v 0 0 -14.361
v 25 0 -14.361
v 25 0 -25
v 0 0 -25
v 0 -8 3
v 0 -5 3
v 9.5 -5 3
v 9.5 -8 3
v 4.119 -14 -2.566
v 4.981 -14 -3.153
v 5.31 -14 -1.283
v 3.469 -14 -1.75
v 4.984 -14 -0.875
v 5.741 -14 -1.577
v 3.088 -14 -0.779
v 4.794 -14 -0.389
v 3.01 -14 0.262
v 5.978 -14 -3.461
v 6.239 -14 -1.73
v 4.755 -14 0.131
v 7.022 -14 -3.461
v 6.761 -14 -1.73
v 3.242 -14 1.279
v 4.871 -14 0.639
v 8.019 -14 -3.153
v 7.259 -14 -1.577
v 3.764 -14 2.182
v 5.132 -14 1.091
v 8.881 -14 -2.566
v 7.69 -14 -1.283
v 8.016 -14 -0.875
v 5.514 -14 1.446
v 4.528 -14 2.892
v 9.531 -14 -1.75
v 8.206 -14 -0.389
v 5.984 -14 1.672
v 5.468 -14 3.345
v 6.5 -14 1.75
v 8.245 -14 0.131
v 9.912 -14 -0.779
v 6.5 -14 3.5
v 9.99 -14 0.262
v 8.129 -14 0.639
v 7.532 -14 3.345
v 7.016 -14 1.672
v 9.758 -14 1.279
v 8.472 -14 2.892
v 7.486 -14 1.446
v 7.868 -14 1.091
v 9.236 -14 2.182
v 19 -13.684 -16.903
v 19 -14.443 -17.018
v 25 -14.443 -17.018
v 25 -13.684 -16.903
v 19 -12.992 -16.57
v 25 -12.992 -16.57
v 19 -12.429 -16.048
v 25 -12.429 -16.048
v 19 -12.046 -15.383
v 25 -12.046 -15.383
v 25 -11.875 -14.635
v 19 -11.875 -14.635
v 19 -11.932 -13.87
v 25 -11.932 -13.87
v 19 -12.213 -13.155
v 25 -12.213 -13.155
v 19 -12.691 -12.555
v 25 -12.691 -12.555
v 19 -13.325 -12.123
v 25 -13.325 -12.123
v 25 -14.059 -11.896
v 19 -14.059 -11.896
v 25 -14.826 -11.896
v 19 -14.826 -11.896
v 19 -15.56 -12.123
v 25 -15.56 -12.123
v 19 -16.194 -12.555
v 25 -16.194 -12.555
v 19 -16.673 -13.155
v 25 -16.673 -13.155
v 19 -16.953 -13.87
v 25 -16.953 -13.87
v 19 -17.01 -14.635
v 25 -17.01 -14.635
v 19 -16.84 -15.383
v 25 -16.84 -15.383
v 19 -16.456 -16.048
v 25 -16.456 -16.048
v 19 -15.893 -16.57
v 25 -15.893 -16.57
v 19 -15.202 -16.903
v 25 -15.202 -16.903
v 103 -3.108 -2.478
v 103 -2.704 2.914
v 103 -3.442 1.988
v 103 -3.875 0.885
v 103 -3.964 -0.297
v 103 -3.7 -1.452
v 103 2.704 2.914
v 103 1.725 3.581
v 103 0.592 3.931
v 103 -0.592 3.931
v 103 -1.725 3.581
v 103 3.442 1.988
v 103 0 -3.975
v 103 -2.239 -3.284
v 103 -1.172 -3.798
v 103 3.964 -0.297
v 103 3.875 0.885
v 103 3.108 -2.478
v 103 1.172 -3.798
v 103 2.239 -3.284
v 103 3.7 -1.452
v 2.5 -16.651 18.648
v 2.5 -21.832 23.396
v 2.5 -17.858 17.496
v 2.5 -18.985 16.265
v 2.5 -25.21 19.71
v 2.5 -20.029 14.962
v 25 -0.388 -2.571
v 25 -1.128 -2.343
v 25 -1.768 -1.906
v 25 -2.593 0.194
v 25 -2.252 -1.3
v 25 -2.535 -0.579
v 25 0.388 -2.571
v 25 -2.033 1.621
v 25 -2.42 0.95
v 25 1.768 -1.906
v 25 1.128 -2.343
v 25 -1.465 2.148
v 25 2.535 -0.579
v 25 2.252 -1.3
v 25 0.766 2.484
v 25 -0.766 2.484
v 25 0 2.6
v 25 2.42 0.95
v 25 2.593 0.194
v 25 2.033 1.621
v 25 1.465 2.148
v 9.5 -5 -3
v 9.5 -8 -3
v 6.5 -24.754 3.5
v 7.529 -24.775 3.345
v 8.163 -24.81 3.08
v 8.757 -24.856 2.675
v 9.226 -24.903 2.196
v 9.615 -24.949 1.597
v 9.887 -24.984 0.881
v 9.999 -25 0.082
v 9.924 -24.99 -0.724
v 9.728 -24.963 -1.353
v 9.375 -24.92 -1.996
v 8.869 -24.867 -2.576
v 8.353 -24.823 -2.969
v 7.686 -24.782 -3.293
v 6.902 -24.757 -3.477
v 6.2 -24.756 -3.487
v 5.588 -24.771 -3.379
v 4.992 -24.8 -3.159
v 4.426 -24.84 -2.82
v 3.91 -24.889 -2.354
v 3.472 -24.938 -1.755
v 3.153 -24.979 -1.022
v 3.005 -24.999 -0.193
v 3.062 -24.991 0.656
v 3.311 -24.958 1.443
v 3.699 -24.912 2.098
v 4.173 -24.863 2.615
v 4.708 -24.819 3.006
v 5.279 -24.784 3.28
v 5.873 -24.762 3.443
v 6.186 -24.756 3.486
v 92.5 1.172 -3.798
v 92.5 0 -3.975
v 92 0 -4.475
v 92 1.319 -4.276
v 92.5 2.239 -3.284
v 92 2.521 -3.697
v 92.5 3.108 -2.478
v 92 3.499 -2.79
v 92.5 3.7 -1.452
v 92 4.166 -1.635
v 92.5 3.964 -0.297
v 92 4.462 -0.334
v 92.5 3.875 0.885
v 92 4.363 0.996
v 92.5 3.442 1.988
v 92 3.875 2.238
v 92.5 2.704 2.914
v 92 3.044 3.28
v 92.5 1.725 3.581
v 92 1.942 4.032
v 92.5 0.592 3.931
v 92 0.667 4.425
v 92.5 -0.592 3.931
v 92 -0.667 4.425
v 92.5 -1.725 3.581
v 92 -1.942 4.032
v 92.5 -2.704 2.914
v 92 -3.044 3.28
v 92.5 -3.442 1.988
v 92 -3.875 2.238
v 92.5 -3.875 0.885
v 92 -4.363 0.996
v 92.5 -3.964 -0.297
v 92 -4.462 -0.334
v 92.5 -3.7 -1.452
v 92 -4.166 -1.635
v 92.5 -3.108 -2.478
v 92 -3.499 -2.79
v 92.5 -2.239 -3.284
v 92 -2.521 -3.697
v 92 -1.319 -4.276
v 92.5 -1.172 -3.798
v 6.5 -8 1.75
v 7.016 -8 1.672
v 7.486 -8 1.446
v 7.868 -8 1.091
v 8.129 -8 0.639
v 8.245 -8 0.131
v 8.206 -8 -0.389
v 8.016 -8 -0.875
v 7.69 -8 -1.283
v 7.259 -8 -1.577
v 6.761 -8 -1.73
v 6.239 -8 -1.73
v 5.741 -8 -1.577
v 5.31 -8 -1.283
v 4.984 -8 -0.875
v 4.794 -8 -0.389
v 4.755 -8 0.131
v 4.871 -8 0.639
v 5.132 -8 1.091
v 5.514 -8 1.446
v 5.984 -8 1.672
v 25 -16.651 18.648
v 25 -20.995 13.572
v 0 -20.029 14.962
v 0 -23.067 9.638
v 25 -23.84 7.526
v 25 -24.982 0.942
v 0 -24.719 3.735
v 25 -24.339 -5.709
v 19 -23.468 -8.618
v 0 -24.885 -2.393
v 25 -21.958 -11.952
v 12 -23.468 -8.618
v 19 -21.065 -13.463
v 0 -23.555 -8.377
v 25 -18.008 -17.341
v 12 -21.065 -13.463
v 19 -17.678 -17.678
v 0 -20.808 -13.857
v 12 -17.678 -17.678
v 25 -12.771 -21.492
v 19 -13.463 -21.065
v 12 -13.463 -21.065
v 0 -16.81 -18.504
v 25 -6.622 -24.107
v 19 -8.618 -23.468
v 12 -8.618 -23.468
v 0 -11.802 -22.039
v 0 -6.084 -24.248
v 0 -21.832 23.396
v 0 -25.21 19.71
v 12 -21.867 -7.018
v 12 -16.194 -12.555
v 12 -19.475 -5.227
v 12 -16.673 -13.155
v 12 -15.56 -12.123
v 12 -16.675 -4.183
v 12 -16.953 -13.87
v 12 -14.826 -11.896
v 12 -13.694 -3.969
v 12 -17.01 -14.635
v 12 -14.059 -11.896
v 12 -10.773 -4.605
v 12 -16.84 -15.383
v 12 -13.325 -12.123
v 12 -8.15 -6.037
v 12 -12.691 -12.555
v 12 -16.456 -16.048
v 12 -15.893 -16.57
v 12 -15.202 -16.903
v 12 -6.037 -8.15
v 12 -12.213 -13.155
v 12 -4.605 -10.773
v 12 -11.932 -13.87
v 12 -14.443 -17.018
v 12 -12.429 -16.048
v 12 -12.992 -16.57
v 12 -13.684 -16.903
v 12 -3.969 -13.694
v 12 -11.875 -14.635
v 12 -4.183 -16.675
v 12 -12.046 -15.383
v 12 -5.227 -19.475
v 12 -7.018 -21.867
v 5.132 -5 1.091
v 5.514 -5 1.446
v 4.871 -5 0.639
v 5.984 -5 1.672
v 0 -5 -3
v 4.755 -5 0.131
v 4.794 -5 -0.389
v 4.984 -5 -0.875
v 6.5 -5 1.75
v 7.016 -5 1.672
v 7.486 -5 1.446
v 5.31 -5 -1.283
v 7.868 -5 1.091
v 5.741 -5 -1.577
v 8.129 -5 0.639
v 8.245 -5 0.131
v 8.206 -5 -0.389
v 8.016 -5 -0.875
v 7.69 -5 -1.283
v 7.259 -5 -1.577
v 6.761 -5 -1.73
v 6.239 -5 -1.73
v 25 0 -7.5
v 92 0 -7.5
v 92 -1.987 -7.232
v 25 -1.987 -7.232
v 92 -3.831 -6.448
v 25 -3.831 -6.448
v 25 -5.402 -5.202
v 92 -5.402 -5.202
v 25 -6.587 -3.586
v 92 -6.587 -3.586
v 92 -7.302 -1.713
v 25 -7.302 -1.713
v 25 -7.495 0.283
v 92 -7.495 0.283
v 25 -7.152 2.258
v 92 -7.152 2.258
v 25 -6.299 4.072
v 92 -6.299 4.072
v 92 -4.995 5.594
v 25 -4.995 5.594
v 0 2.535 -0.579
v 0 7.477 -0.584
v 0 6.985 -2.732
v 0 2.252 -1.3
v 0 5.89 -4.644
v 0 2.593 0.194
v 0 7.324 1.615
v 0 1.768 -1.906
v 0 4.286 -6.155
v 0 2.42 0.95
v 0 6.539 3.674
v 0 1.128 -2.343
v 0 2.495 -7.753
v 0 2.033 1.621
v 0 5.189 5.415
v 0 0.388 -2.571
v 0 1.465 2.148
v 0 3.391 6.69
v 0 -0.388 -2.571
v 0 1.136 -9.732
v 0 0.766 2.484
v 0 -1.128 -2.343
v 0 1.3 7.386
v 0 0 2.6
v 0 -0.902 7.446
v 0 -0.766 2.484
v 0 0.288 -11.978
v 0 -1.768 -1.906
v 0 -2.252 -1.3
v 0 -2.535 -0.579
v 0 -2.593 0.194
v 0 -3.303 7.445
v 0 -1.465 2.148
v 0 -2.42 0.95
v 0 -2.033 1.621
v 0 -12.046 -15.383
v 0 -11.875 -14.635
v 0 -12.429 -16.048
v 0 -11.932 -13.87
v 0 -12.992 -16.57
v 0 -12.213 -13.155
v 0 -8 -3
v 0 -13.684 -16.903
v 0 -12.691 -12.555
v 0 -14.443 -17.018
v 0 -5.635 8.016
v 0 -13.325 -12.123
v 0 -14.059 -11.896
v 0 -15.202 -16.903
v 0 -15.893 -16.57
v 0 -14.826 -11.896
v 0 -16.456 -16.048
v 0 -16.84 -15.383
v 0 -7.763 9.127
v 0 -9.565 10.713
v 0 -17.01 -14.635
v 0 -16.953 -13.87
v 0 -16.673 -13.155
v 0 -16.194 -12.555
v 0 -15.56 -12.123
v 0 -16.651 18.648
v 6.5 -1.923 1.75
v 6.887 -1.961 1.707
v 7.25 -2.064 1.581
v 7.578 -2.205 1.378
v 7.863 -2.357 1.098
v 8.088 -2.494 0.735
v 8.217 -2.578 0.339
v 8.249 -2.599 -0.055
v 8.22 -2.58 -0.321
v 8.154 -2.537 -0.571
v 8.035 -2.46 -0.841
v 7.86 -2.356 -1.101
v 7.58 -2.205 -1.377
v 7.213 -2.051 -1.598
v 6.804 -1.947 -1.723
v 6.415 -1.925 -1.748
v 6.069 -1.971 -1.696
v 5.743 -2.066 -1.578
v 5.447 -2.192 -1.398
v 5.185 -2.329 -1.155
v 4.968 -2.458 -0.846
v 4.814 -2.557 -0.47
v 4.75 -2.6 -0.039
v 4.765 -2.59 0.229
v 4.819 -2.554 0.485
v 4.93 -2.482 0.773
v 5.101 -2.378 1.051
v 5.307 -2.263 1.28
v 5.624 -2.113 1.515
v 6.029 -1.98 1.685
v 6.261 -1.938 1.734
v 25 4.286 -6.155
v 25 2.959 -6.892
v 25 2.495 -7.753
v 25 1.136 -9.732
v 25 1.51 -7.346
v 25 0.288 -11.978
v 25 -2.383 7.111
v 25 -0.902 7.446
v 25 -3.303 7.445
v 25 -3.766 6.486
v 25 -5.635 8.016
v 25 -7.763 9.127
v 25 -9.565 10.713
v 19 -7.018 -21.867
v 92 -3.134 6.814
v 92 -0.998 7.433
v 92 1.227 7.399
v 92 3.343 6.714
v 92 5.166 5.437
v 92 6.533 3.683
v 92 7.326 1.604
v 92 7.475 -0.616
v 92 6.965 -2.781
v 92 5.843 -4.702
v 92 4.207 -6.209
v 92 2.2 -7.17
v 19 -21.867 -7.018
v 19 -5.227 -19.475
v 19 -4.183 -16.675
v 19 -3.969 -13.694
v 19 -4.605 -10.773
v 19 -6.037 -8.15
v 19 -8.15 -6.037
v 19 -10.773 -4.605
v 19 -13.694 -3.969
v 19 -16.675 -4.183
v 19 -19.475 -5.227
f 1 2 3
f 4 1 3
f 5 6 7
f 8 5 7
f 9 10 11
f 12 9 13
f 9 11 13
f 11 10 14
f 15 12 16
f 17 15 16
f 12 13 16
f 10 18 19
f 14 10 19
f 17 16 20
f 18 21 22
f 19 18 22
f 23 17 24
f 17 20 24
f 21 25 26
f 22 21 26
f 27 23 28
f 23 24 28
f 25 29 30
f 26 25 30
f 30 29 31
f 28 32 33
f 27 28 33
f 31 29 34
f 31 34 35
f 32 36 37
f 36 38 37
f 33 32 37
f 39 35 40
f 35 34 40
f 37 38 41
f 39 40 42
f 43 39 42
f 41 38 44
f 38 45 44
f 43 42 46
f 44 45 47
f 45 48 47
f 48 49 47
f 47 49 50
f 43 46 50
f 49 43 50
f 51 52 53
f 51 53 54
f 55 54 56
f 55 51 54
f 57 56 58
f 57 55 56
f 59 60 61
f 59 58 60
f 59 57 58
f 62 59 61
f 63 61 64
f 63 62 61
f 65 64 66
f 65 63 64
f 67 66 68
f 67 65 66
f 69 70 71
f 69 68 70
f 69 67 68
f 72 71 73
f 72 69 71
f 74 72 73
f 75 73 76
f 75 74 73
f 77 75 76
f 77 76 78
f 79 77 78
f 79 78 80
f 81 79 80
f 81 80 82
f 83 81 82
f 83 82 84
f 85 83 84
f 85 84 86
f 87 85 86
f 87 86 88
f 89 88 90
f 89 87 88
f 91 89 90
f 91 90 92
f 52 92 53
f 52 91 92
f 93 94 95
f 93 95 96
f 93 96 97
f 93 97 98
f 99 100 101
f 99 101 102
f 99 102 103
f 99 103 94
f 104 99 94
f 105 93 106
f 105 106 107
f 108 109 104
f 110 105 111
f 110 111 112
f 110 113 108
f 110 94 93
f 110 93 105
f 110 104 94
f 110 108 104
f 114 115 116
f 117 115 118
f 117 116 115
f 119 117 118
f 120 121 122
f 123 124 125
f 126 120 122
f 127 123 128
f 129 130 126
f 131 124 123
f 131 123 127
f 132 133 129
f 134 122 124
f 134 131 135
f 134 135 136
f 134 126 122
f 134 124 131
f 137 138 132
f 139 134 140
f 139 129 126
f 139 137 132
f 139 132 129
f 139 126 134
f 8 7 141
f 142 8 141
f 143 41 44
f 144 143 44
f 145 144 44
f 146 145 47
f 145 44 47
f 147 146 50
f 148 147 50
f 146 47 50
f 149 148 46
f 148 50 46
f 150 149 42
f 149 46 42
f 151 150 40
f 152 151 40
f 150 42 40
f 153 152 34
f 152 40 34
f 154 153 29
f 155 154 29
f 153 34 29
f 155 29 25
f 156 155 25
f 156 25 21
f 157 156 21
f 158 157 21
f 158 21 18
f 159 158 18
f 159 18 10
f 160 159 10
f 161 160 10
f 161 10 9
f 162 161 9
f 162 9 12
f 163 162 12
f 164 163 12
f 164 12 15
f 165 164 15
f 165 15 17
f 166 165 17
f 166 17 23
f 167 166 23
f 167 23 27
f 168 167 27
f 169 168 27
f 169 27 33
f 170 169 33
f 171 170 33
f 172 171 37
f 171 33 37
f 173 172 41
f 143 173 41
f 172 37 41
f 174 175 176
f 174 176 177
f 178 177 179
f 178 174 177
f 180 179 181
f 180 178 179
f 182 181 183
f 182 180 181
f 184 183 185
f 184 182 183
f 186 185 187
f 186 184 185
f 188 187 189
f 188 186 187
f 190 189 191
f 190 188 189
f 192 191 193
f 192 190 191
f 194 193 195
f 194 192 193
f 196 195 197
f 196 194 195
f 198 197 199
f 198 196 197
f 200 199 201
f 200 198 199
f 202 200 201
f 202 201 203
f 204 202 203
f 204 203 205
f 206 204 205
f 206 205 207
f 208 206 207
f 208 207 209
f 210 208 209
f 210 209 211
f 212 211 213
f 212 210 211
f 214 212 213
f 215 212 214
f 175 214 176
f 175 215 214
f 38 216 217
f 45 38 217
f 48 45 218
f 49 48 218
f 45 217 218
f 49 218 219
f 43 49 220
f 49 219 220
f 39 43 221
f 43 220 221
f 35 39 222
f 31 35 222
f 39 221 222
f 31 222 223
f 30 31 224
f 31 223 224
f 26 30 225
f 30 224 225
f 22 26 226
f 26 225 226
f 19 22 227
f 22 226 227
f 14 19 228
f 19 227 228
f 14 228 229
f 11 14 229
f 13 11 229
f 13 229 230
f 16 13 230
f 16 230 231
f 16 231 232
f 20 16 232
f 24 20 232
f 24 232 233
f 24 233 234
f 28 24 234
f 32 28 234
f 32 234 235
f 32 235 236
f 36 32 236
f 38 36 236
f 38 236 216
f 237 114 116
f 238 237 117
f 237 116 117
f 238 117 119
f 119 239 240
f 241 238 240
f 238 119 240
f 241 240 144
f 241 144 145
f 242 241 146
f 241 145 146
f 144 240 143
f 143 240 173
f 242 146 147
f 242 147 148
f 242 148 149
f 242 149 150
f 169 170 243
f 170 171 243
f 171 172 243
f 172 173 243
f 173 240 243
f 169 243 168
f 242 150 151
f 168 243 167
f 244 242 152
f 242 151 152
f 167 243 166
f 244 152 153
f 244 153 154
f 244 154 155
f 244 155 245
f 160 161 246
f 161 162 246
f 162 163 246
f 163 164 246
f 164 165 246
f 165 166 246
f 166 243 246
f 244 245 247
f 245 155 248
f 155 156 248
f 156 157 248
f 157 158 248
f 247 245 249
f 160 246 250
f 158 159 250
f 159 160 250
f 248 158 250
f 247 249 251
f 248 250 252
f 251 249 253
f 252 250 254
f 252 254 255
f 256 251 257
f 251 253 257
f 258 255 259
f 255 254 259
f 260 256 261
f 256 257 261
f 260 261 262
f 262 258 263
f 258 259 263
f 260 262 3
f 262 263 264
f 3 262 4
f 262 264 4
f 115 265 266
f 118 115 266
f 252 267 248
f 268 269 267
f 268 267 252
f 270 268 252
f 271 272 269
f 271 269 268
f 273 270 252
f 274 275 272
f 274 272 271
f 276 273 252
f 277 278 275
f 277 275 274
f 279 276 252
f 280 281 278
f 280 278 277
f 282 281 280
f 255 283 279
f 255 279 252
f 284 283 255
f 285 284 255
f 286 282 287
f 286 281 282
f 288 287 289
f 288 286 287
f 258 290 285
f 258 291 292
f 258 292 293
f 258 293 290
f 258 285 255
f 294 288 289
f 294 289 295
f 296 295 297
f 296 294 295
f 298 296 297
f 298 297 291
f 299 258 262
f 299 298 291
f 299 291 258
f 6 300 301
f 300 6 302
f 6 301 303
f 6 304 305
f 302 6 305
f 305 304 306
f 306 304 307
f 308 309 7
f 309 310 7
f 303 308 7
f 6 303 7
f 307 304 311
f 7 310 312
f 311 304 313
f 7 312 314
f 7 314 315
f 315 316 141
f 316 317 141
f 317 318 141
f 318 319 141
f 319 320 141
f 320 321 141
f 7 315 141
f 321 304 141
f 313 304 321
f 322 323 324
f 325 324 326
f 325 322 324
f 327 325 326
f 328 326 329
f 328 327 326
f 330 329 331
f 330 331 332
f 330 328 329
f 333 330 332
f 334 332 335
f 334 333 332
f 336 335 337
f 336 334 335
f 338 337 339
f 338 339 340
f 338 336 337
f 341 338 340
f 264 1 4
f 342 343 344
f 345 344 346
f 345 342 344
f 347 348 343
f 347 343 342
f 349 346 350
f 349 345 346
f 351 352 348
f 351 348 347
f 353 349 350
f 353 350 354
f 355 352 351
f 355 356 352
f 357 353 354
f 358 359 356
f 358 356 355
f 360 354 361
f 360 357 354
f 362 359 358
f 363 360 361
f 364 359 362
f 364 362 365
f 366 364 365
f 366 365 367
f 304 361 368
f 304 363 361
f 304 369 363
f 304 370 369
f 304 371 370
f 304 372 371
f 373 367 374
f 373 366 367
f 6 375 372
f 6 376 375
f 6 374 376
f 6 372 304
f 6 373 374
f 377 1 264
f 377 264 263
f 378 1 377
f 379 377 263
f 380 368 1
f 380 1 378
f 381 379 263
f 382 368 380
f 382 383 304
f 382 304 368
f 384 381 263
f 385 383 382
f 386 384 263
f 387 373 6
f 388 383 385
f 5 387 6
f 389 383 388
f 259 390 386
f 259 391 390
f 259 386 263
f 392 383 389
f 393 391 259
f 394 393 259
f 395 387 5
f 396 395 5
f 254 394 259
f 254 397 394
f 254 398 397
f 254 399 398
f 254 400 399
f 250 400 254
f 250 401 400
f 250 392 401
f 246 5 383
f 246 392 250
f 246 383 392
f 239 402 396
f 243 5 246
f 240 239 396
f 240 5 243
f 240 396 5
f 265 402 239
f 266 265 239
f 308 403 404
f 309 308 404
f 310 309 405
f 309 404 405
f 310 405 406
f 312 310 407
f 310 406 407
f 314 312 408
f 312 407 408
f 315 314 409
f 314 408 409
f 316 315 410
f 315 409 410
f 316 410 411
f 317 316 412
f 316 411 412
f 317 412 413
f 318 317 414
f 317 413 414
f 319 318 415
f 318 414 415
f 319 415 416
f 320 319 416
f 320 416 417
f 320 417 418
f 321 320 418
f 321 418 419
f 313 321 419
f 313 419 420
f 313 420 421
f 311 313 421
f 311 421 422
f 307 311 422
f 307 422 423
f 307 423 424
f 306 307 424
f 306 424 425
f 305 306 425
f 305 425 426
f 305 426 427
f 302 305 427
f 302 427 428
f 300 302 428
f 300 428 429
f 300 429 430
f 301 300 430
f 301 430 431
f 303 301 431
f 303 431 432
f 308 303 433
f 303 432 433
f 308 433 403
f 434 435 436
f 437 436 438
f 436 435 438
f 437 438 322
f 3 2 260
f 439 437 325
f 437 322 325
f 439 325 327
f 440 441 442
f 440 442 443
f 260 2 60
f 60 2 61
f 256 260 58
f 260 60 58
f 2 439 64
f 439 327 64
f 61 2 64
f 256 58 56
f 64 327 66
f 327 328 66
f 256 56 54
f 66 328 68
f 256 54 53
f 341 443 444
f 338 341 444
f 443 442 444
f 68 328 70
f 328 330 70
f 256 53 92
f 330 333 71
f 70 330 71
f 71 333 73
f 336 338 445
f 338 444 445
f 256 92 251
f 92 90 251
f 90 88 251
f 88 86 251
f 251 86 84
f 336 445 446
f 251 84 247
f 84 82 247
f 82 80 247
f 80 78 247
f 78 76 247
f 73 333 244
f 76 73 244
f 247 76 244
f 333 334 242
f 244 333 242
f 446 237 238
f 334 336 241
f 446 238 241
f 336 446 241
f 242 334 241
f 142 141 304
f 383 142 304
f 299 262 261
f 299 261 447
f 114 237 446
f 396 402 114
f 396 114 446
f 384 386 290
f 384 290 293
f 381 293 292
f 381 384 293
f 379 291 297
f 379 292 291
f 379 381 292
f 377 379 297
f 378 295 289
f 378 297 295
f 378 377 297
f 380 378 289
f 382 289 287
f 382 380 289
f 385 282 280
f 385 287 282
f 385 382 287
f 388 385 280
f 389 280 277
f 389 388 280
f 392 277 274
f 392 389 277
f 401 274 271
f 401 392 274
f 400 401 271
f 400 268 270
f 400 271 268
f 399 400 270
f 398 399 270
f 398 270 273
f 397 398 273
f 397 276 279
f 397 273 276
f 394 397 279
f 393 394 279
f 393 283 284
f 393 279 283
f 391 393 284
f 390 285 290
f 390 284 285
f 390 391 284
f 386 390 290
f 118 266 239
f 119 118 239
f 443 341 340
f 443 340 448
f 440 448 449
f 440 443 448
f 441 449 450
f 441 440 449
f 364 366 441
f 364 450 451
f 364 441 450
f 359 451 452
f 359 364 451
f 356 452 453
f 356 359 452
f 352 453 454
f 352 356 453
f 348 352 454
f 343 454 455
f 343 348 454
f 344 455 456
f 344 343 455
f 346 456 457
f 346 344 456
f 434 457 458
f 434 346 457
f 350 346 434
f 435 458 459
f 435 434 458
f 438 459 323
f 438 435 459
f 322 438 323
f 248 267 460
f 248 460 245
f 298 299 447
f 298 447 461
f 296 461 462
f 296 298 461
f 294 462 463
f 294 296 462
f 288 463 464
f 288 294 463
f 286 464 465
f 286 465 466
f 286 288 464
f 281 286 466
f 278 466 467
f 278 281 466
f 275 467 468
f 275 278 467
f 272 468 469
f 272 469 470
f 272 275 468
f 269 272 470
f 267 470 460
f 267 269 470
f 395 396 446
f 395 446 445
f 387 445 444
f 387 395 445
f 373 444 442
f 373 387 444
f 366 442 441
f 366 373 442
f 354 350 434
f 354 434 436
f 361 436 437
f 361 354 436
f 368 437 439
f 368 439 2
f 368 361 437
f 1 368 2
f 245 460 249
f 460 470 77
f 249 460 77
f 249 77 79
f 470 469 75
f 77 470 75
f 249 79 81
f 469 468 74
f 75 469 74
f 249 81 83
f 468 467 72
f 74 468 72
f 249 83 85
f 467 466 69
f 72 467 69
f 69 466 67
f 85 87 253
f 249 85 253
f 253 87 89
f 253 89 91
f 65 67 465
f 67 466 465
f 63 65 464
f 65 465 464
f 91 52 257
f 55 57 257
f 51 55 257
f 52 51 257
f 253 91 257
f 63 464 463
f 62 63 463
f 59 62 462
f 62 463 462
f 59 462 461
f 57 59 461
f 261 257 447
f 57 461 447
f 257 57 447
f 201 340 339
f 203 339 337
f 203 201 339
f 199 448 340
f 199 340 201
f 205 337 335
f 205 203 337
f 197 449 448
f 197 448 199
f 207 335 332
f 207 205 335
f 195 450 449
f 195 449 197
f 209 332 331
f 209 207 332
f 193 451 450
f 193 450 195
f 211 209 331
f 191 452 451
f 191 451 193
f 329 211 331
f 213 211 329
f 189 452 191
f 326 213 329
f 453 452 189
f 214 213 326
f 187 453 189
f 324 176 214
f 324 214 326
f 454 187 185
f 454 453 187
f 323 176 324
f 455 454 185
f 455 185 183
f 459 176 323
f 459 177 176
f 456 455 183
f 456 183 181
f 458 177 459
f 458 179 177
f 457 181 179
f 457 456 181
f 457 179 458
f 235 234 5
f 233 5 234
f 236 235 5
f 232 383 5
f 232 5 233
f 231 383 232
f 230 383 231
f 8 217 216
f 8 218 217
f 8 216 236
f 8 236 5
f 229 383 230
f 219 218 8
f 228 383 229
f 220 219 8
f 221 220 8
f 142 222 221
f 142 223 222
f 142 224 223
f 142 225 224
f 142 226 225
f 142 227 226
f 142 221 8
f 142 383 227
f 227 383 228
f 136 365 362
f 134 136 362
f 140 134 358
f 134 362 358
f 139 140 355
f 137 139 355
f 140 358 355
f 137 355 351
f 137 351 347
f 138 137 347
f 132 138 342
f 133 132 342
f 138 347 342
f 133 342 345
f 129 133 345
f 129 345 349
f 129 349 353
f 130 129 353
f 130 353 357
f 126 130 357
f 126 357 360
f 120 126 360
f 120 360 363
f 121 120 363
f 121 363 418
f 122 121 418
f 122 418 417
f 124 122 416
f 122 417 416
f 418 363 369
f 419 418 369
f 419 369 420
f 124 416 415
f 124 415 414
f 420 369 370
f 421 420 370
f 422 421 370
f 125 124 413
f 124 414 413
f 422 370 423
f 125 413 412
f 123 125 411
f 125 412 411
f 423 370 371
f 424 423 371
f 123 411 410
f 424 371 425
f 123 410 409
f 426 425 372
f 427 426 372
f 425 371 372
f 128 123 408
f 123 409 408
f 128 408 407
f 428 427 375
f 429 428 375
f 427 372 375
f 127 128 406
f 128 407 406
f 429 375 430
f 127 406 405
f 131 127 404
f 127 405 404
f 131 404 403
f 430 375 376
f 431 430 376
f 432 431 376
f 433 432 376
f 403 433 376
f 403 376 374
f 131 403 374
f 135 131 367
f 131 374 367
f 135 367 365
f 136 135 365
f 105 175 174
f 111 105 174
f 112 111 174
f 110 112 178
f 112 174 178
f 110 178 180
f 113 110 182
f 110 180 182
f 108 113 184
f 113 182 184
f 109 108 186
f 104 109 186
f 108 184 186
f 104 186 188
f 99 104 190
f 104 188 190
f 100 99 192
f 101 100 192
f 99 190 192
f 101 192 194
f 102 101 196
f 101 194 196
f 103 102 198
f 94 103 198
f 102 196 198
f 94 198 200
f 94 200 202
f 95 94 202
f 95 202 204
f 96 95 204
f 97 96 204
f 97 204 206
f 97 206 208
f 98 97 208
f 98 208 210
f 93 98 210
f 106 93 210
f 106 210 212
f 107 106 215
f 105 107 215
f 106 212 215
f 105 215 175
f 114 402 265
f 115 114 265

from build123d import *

# Parameters (mm, degrees)
SKETCH1_R                = 25
BOSS_EXTRUDE1_DEPTH      = 92
CUT_EXTRUDE1_START       = 12
CUT_EXTRUDE1_DEPTH       = 7
CUT_EXTRUDE2_START       = 48
CUT_EXTRUDE2_DEPTH       = 7
CUT_EXTRUDE3_START       = 24
CUT_EXTRUDE3_DEPTH       = 7
CUT_EXTRUDE7_START       = 60
CUT_EXTRUDE7_DEPTH       = 7
CUT_EXTRUDE8_START       = 36
CUT_EXTRUDE8_DEPTH       = 7
CUT_EXTRUDE9_START       = 72
CUT_EXTRUDE9_DEPTH       = 7
CUT_EXTRUDE10_DEPTH      = 8
CUT_EXTRUDE10_DEPTH_BACK = 64
CUT_EXTRUDE10_START      = 19
SKETCH1_28_R             = 2.575
CUT_EXTRUDE11_DEPTH      = 8
CUT_EXTRUDE11_DEPTH_BACK = 73
CUT_EXTRUDE11_START      = 31
SKETCH1_29_R             = 2.575
CUT_EXTRUDE12_DEPTH      = 8
CUT_EXTRUDE12_DEPTH_BACK = 183
CUT_EXTRUDE12_START      = 43
SKETCH1_30_R             = 2.575
CUT_EXTRUDE13_DEPTH      = 74
CUT_EXTRUDE13_DEPTH_BACK = 8
CUT_EXTRUDE13_START      = 48
SKETCH1_31_R             = 2.575
CUT_EXTRUDE14_DEPTH      = 87
CUT_EXTRUDE14_DEPTH_BACK = 8
CUT_EXTRUDE14_START      = 60
SKETCH1_32_R             = 2.575
CUT_EXTRUDE15_DEPTH      = 124
CUT_EXTRUDE15_DEPTH_BACK = 8
CUT_EXTRUDE15_START      = 72
SKETCH1_33_R             = 2.575
SKETCH2_R                = 2.6
CUT_EXTRUDE16_DEPTH      = 25
SKETCH4_R                = 3.975
BOSS_EXTRUDE2_DEPTH      = 11
SKETCH5_R                = 1.75
CUT_EXTRUDE17_DEPTH      = 58
CUT_EXTRUDE18_START      = -5
SKETCH5_3_R              = 1.75
CUT_EXTRUDE18_DEPTH      = 3
CUT_EXTRUDE19_START      = -14
SKETCH5_4_R              = 3.5
CUT_EXTRUDE19_DEPTH      = 95.89903586
CHAMFER1_SIZE            = 0.5
BOSS_EXTRUDE3_DEPTH      = 2.5
CUT_EXTRUDE20_START      = -67
SKETCH7_R                = 2.575
CUT_EXTRUDE20_DEPTH      = 67
CUT_EXTRUDE22_START      = -123
CUT_EXTRUDE22_DEPTH      = 123
FILLET1_R                = 10


with BuildPart() as part:
    # Sketch1 → Boss-Extrude1 (new body)
    with BuildSketch(Plane(origin=(0, 0, 0), x_dir=(0, 0, -1), z_dir=(1, 0, 0))):
        Circle(SKETCH1_R)
    extrude(amount=BOSS_EXTRUDE1_DEPTH)

    # Sketch1<3> → Cut-Extrude1 (cut)
    with BuildSketch(Plane(origin=(0, 0, 0), x_dir=(0, 0, -1), z_dir=(1, 0, 0)).offset(CUT_EXTRUDE1_START)):
        with BuildLine():
            ThreePointArc((8.618290005, -23.46753241), (17.67766953, -17.67766953), (23.46753241, -8.618290005))
            Line((23.46753241, -8.618290005), (21.867277208, -7.018034803))
            ThreePointArc((21.867277208, -7.018034803), (7.018034803, -7.018034803), (7.018034803, -21.867277208))
            Line((7.018034803, -21.867277208), (8.618290005, -23.46753241))
        make_face()
    extrude(amount=CUT_EXTRUDE1_DEPTH, mode=Mode.SUBTRACT)

    # Sketch1<8> → Cut-Extrude2 (cut)
    with BuildSketch(Plane(origin=(0, 0, 0), x_dir=(0, 0, -1), z_dir=(1, 0, 0)).offset(CUT_EXTRUDE2_START)):
        with BuildLine():
            ThreePointArc((20.425, 10.5), (9.925, 0), (20.425, -10.5))
            Line((20.425, -10.5), (22.688102609, -10.5))
            ThreePointArc((22.688102609, -10.5), (25, 0), (22.688102609, 10.5))
            Line((22.688102609, 10.5), (20.425, 10.5))
        make_face()
    extrude(amount=CUT_EXTRUDE2_DEPTH, mode=Mode.SUBTRACT)

    # Sketch1<9> → Cut-Extrude3 (cut)
    with BuildSketch(Plane(origin=(0, 0, 0), x_dir=(0, 0, -1), z_dir=(1, 0, 0)).offset(CUT_EXTRUDE3_START)):
        with BuildLine():
            ThreePointArc((7.018034803, 21.867277208), (7.018034803, 7.018034803), (21.867277208, 7.018034803))
            Line((21.867277208, 7.018034803), (23.46753241, 8.618290005))
            ThreePointArc((23.46753241, 8.618290005), (17.67766953, 17.67766953), (8.618290005, 23.46753241))
            Line((8.618290005, 23.46753241), (7.018034803, 21.867277208))
        make_face()
    extrude(amount=CUT_EXTRUDE3_DEPTH, mode=Mode.SUBTRACT)

    # Sketch1<10> → Cut-Extrude7 (cut)
    with BuildSketch(Plane(origin=(0, 0, 0), x_dir=(0, 0, -1), z_dir=(1, 0, 0)).offset(CUT_EXTRUDE7_START)):
        with BuildLine():
            Line((-10.5, 22.688102609), (-10.5, 20.425))
            ThreePointArc((-10.5, 20.425), (0, 9.925), (10.5, 20.425))
            Line((10.5, 20.425), (10.5, 22.688102609))
            ThreePointArc((10.5, 22.688102609), (0, 25), (-10.5, 22.688102609))
        make_face()
    extrude(amount=CUT_EXTRUDE7_DEPTH, mode=Mode.SUBTRACT)

    # Sketch1<11> → Cut-Extrude8 (cut)
    with BuildSketch(Plane(origin=(0, 0, 0), x_dir=(0, 0, -1), z_dir=(1, 0, 0)).offset(CUT_EXTRUDE8_START)):
        with BuildLine():
            Line((-23.46753241, 8.618290005), (-21.867277208, 7.018034803))
            ThreePointArc((-21.867277208, 7.018034803), (-7.018034803, 7.018034803), (-7.018034803, 21.867277208))
            Line((-7.018034803, 21.867277208), (-8.618290005, 23.46753241))
            ThreePointArc((-8.618290005, 23.46753241), (-17.67766953, 17.67766953), (-23.46753241, 8.618290005))
        make_face()
    extrude(amount=CUT_EXTRUDE8_DEPTH, mode=Mode.SUBTRACT)

    # Sketch1<12> → Cut-Extrude9 (cut)
    with BuildSketch(Plane(origin=(0, 0, 0), x_dir=(0, 0, -1), z_dir=(1, 0, 0)).offset(CUT_EXTRUDE9_START)):
        with BuildLine():
            Line((-22.688102609, -10.5), (-20.425, -10.5))
            ThreePointArc((-20.425, -10.5), (-9.925, 0), (-20.425, 10.5))
            Line((-20.425, 10.5), (-22.688102609, 10.5))
            ThreePointArc((-22.688102609, 10.5), (-25, 0), (-22.688102609, -10.5))
        make_face()
    extrude(amount=CUT_EXTRUDE9_DEPTH, mode=Mode.SUBTRACT)

    # Sketch1<28> → Cut-Extrude10 (cut, two sides: drawn at the far end of the back side and taken through both)
    with BuildSketch(Plane(origin=(0, 0, 0), x_dir=(0, 0, -1), z_dir=(1, 0, 0)).offset(CUT_EXTRUDE10_START - CUT_EXTRUDE10_DEPTH_BACK)):
        with Locations((14.442656006, -14.442656006)):
            Circle(SKETCH1_28_R)
    extrude(amount=CUT_EXTRUDE10_DEPTH + CUT_EXTRUDE10_DEPTH_BACK, mode=Mode.SUBTRACT)

    # Sketch1<29> → Cut-Extrude11 (cut, two sides: drawn at the far end of the back side and taken through both)
    with BuildSketch(Plane(origin=(0, 0, 0), x_dir=(0, 0, -1), z_dir=(1, 0, 0)).offset(CUT_EXTRUDE11_START - CUT_EXTRUDE11_DEPTH_BACK)):
        with Locations((14.442656006, 14.442656006)):
            Circle(SKETCH1_29_R)
    extrude(amount=CUT_EXTRUDE11_DEPTH + CUT_EXTRUDE11_DEPTH_BACK, mode=Mode.SUBTRACT)

    # Sketch1<30> → Cut-Extrude12 (cut, two sides: drawn at the far end of the back side and taken through both)
    with BuildSketch(Plane(origin=(0, 0, 0), x_dir=(0, 0, -1), z_dir=(1, 0, 0)).offset(CUT_EXTRUDE12_START - CUT_EXTRUDE12_DEPTH_BACK)):
        with Locations((-14.442656006, 14.442656006)):
            Circle(SKETCH1_30_R)
    extrude(amount=CUT_EXTRUDE12_DEPTH + CUT_EXTRUDE12_DEPTH_BACK, mode=Mode.SUBTRACT)

    # Sketch1<31> → Cut-Extrude13 (cut, two sides: drawn at the far end of the back side and taken through both)
    with BuildSketch(Plane(origin=(0, 0, 0), x_dir=(0, 0, -1), z_dir=(1, 0, 0)).offset(CUT_EXTRUDE13_START - CUT_EXTRUDE13_DEPTH_BACK)):
        with Locations((20.425, 0)):
            Circle(SKETCH1_31_R)
    extrude(amount=CUT_EXTRUDE13_DEPTH + CUT_EXTRUDE13_DEPTH_BACK, mode=Mode.SUBTRACT)

    # Sketch1<32> → Cut-Extrude14 (cut, two sides: drawn at the far end of the back side and taken through both)
    with BuildSketch(Plane(origin=(0, 0, 0), x_dir=(0, 0, -1), z_dir=(1, 0, 0)).offset(CUT_EXTRUDE14_START - CUT_EXTRUDE14_DEPTH_BACK)):
        with Locations((0, 20.425)):
            Circle(SKETCH1_32_R)
    extrude(amount=CUT_EXTRUDE14_DEPTH + CUT_EXTRUDE14_DEPTH_BACK, mode=Mode.SUBTRACT)

    # Sketch1<33> → Cut-Extrude15 (cut, two sides: drawn at the far end of the back side and taken through both)
    with BuildSketch(Plane(origin=(0, 0, 0), x_dir=(0, 0, -1), z_dir=(1, 0, 0)).offset(CUT_EXTRUDE15_START - CUT_EXTRUDE15_DEPTH_BACK)):
        with Locations((-20.425, 0)):
            Circle(SKETCH1_33_R)
    extrude(amount=CUT_EXTRUDE15_DEPTH + CUT_EXTRUDE15_DEPTH_BACK, mode=Mode.SUBTRACT)

    # Sketch2 → Cut-Extrude16 (cut)
    with BuildSketch(Plane.ZY):
        Circle(SKETCH2_R)
    extrude(amount=-CUT_EXTRUDE16_DEPTH, mode=Mode.SUBTRACT)

    # Sketch4 → Boss-Extrude2 (add)
    with BuildSketch(Plane(origin=(92, 0, 0), x_dir=(0, 0, -1), z_dir=(1, 0, 0))):
        Circle(SKETCH4_R)
    extrude(amount=BOSS_EXTRUDE2_DEPTH)

    # Sketch5 → Cut-Extrude17 (cut)
    with BuildSketch(Plane(origin=(0, 0, 0), x_dir=(1, 0, 0), z_dir=(0, 1, 0))):
        with Locations(Location((6.5, 0, 0), (0, 0, 270))):
            Circle(SKETCH5_R)
    extrude(amount=-CUT_EXTRUDE17_DEPTH, mode=Mode.SUBTRACT)

    # Sketch5<3> → Cut-Extrude18 (cut)
    # profile 1 of 5: a face of its own
    with BuildSketch(Plane(origin=(0, 0, 0), x_dir=(1, 0, 0), z_dir=(0, 1, 0)).offset(CUT_EXTRUDE18_START)):
        with BuildLine():
            Line((9.5, 1.802775638), (9.5, 3))
            Line((9.5, 3), (8.302775638, 3))
            ThreePointArc((8.302775638, 3), (8.974873734, 2.474873734), (9.5, 1.802775638))
        make_face()
    # profile 2 of 5: a face of its own
    with BuildSketch(Plane(origin=(0, 0, 0), x_dir=(1, 0, 0), z_dir=(0, 1, 0)).offset(CUT_EXTRUDE18_START)):
        with BuildLine():
            Line((8.302775638, 3), (4.697224362, 3))
            ThreePointArc((4.697224362, 3), (3, 0), (4.697224362, -3))
            Line((4.697224362, -3), (8.302775638, -3))
            ThreePointArc((8.302775638, -3), (8.974873734, -2.474873734), (9.5, -1.802775638))
            Line((9.5, -1.802775638), (9.5, 1.802775638))
            ThreePointArc((9.5, 1.802775638), (8.974873734, 2.474873734), (8.302775638, 3))
        make_face()
        with Locations(Location((6.5, 0, 0), (0, 0, 270))):
            Circle(SKETCH5_3_R, mode=Mode.SUBTRACT)
    # profile 3 of 5: a face of its own
    with BuildSketch(Plane(origin=(0, 0, 0), x_dir=(1, 0, 0), z_dir=(0, 1, 0)).offset(CUT_EXTRUDE18_START)):
        with BuildLine():
            Line((8.302775638, -3), (9.5, -3))
            Line((9.5, -3), (9.5, -1.802775638))
            ThreePointArc((9.5, -1.802775638), (8.974873734, -2.474873734), (8.302775638, -3))
        make_face()
    # profile 4 of 5: a face of its own
    with BuildSketch(Plane(origin=(0, 0, 0), x_dir=(1, 0, 0), z_dir=(0, 1, 0)).offset(CUT_EXTRUDE18_START)):
        with BuildLine():
            Line((4.697224362, 3), (0, 3))
            Line((0, 3), (0, -3))
            Line((0, -3), (4.697224362, -3))
            ThreePointArc((4.697224362, -3), (3, 0), (4.697224362, 3))
        make_face()
    # profile 5 of 5: a face of its own
    with BuildSketch(Plane(origin=(0, 0, 0), x_dir=(1, 0, 0), z_dir=(0, 1, 0)).offset(CUT_EXTRUDE18_START)):
        with Locations(Location((6.5, 0, 0), (0, 0, 270))):
            Circle(SKETCH5_3_R)
    extrude(amount=-CUT_EXTRUDE18_DEPTH, mode=Mode.SUBTRACT)

    # Sketch5<4> → Cut-Extrude19 (cut, through all)
    with BuildSketch(Plane(origin=(0, 0, 0), x_dir=(1, 0, 0), z_dir=(0, 1, 0)).offset(CUT_EXTRUDE19_START)):
        with Locations(Location((6.5, 0, 0), (0, 0, 270))):
            Circle(SKETCH5_4_R)
    extrude(amount=-CUT_EXTRUDE19_DEPTH, mode=Mode.SUBTRACT)

    # Chamfer1
    chamfer1_edges = [part.edges().sort_by_distance(p)[0] for p in [
        (92, 0, 3.975),
    ]]
    chamfer(chamfer1_edges, length=CHAMFER1_SIZE)

    # Sketch6 → Boss-Extrude3 (add)
    with BuildSketch(Plane.ZY):
        Polygon((23.3960034, -21.83178932), (19.709616716, -25.209740358), (12.95371464, -17.836966989), (16.640101324, -14.459015951), align=None)
    extrude(amount=-BOSS_EXTRUDE3_DEPTH)

    # Sketch7 → Cut-Extrude20 (cut)
    # profile 1 of 8: a face of its own
    with BuildSketch(Plane(origin=(92, 0, 0), x_dir=(0, 0, -1), z_dir=(1, 0, 0)).offset(CUT_EXTRUDE20_START)):
        with BuildLine():
            ThreePointArc((7.5, 0), (2.673139817, -7.007447718), (-5.594486272, -4.995170003))
            Line((-5.594486272, -4.995170003), (-18.648287572, -16.650566676))
            ThreePointArc((-18.648287572, -16.650566676), (8.910466057, -23.35815906), (25, 0))
            Line((25, 0), (23, 0))
            ThreePointArc((23, 0), (20.425, -2.575), (17.85, 0))
            Line((17.85, 0), (7.5, 0))
        make_face()
    # profile 2 of 8: a face of its own
    with BuildSketch(Plane(origin=(92, 0, 0), x_dir=(0, 0, -1), z_dir=(1, 0, 0)).offset(CUT_EXTRUDE20_START)):
        with BuildLine():
            Line((-18.648287572, -16.650566676), (-5.594486272, -4.995170003))
            ThreePointArc((-5.594486272, -4.995170003), (-2.673139817, 7.007447718), (7.5, 0))
            Line((7.5, 0), (17.85, 0))
            ThreePointArc((17.85, 0), (20.425, 2.575), (23, 0))
            Line((23, 0), (25, 0))
            ThreePointArc((25, 0), (-8.910466057, 23.35815906), (-18.648287572, -16.650566676))
        make_face()
        with Locations((-20.425, 0)):
            Circle(SKETCH7_R, mode=Mode.SUBTRACT)
        with Locations((0, 20.425)):
            Circle(SKETCH7_R, mode=Mode.SUBTRACT)
    # profile 3 of 8: a face of its own
    with BuildSketch(Plane(origin=(92, 0, 0), x_dir=(0, 0, -1), z_dir=(1, 0, 0)).offset(CUT_EXTRUDE20_START)):
        with Locations((-20.425, 0)):
            Circle(SKETCH7_R)
    # profile 4 of 8: a face of its own
    with BuildSketch(Plane(origin=(92, 0, 0), x_dir=(0, 0, -1), z_dir=(1, 0, 0)).offset(CUT_EXTRUDE20_START)):
        with Locations((0, 20.425)):
            Circle(SKETCH7_R)
    # profile 5 of 8: a face of its own
    with BuildSketch(Plane(origin=(92, 0, 0), x_dir=(0, 0, -1), z_dir=(1, 0, 0)).offset(CUT_EXTRUDE20_START)):
        with BuildLine():
            ThreePointArc((23, 0), (20.425, 2.575), (17.85, 0))
            Line((17.85, 0), (23, 0))
        make_face()
    # profile 6 of 8: a face of its own
    with BuildSketch(Plane(origin=(92, 0, 0), x_dir=(0, 0, -1), z_dir=(1, 0, 0)).offset(CUT_EXTRUDE20_START)):
        with BuildLine():
            Line((23, 0), (17.85, 0))
            ThreePointArc((17.85, 0), (20.425, -2.575), (23, 0))
        make_face()
    # profile 7 of 8: a face of its own
    with BuildSketch(Plane(origin=(92, 0, 0), x_dir=(0, 0, -1), z_dir=(1, 0, 0)).offset(CUT_EXTRUDE20_START)):
        with BuildLine():
            ThreePointArc((23, 0), (20.425, 2.575), (17.85, 0))
            Line((17.85, 0), (23, 0))
        make_face()
    # profile 8 of 8: a face of its own
    with BuildSketch(Plane(origin=(92, 0, 0), x_dir=(0, 0, -1), z_dir=(1, 0, 0)).offset(CUT_EXTRUDE20_START)):
        with BuildLine():
            Line((23, 0), (17.85, 0))
            ThreePointArc((17.85, 0), (20.425, -2.575), (23, 0))
        make_face()
    extrude(amount=CUT_EXTRUDE20_DEPTH, mode=Mode.SUBTRACT)

    # Sketch7<6> → Cut-Extrude22 (cut)
    with BuildSketch(Plane(origin=(92, 0, 0), x_dir=(0, 0, -1), z_dir=(1, 0, 0)).offset(CUT_EXTRUDE22_START)):
        with BuildLine():
            Line((-18.648287572, -16.650566676), (-5.594486272, -4.995170003))
            ThreePointArc((-5.594486272, -4.995170003), (-2.673139817, 7.007447718), (7.5, 0))
            Line((7.5, 0), (25, 0))
            ThreePointArc((25, 0), (-8.910466057, 23.35815906), (-18.648287572, -16.650566676))
        make_face()
    extrude(amount=CUT_EXTRUDE22_DEPTH, mode=Mode.SUBTRACT)

    # Fillet1
    # the kernel refuses this fillet: 10 mm, written as the material it adds along each edge
    with BuildSketch(Plane(origin=(0, 0, -7.5), x_dir=(0, 0.9541100058820106, 0.29945633517397796), z_dir=(1, 0, 0))) as fillet1_piece_1:
        with BuildLine():
            CenterArc((7.486408379, -9.541100059), FILLET1_R, 107.42495229, 55.150095421)
            Line((-2.054691679, -6.546536707), (0, 0))
            ThreePointArc((0, 0), (2.245922514, -0.344174956), (4.491845028, 0))
        make_face()
    extrude(amount=25)
    with BuildSketch(Plane(origin=(0, -4.995170003, 5.594486272), x_dir=(0, 0.9111454176217525, 0.4120849766090511), z_dir=(1, 0, 0))) as fillet1_piece_2:
        with BuildLine():
            CenterArc((7.486408379, 9.541100059), FILLET1_R, 197.42495229, 55.150095421)
            Line((-2.054691679, 6.546536707), (0, 0))
            ThreePointArc((0, 0), (2.245922514, 0.344174956), (4.491845028, 0))
        make_face()
    extrude(amount=25)


solid = part.part
